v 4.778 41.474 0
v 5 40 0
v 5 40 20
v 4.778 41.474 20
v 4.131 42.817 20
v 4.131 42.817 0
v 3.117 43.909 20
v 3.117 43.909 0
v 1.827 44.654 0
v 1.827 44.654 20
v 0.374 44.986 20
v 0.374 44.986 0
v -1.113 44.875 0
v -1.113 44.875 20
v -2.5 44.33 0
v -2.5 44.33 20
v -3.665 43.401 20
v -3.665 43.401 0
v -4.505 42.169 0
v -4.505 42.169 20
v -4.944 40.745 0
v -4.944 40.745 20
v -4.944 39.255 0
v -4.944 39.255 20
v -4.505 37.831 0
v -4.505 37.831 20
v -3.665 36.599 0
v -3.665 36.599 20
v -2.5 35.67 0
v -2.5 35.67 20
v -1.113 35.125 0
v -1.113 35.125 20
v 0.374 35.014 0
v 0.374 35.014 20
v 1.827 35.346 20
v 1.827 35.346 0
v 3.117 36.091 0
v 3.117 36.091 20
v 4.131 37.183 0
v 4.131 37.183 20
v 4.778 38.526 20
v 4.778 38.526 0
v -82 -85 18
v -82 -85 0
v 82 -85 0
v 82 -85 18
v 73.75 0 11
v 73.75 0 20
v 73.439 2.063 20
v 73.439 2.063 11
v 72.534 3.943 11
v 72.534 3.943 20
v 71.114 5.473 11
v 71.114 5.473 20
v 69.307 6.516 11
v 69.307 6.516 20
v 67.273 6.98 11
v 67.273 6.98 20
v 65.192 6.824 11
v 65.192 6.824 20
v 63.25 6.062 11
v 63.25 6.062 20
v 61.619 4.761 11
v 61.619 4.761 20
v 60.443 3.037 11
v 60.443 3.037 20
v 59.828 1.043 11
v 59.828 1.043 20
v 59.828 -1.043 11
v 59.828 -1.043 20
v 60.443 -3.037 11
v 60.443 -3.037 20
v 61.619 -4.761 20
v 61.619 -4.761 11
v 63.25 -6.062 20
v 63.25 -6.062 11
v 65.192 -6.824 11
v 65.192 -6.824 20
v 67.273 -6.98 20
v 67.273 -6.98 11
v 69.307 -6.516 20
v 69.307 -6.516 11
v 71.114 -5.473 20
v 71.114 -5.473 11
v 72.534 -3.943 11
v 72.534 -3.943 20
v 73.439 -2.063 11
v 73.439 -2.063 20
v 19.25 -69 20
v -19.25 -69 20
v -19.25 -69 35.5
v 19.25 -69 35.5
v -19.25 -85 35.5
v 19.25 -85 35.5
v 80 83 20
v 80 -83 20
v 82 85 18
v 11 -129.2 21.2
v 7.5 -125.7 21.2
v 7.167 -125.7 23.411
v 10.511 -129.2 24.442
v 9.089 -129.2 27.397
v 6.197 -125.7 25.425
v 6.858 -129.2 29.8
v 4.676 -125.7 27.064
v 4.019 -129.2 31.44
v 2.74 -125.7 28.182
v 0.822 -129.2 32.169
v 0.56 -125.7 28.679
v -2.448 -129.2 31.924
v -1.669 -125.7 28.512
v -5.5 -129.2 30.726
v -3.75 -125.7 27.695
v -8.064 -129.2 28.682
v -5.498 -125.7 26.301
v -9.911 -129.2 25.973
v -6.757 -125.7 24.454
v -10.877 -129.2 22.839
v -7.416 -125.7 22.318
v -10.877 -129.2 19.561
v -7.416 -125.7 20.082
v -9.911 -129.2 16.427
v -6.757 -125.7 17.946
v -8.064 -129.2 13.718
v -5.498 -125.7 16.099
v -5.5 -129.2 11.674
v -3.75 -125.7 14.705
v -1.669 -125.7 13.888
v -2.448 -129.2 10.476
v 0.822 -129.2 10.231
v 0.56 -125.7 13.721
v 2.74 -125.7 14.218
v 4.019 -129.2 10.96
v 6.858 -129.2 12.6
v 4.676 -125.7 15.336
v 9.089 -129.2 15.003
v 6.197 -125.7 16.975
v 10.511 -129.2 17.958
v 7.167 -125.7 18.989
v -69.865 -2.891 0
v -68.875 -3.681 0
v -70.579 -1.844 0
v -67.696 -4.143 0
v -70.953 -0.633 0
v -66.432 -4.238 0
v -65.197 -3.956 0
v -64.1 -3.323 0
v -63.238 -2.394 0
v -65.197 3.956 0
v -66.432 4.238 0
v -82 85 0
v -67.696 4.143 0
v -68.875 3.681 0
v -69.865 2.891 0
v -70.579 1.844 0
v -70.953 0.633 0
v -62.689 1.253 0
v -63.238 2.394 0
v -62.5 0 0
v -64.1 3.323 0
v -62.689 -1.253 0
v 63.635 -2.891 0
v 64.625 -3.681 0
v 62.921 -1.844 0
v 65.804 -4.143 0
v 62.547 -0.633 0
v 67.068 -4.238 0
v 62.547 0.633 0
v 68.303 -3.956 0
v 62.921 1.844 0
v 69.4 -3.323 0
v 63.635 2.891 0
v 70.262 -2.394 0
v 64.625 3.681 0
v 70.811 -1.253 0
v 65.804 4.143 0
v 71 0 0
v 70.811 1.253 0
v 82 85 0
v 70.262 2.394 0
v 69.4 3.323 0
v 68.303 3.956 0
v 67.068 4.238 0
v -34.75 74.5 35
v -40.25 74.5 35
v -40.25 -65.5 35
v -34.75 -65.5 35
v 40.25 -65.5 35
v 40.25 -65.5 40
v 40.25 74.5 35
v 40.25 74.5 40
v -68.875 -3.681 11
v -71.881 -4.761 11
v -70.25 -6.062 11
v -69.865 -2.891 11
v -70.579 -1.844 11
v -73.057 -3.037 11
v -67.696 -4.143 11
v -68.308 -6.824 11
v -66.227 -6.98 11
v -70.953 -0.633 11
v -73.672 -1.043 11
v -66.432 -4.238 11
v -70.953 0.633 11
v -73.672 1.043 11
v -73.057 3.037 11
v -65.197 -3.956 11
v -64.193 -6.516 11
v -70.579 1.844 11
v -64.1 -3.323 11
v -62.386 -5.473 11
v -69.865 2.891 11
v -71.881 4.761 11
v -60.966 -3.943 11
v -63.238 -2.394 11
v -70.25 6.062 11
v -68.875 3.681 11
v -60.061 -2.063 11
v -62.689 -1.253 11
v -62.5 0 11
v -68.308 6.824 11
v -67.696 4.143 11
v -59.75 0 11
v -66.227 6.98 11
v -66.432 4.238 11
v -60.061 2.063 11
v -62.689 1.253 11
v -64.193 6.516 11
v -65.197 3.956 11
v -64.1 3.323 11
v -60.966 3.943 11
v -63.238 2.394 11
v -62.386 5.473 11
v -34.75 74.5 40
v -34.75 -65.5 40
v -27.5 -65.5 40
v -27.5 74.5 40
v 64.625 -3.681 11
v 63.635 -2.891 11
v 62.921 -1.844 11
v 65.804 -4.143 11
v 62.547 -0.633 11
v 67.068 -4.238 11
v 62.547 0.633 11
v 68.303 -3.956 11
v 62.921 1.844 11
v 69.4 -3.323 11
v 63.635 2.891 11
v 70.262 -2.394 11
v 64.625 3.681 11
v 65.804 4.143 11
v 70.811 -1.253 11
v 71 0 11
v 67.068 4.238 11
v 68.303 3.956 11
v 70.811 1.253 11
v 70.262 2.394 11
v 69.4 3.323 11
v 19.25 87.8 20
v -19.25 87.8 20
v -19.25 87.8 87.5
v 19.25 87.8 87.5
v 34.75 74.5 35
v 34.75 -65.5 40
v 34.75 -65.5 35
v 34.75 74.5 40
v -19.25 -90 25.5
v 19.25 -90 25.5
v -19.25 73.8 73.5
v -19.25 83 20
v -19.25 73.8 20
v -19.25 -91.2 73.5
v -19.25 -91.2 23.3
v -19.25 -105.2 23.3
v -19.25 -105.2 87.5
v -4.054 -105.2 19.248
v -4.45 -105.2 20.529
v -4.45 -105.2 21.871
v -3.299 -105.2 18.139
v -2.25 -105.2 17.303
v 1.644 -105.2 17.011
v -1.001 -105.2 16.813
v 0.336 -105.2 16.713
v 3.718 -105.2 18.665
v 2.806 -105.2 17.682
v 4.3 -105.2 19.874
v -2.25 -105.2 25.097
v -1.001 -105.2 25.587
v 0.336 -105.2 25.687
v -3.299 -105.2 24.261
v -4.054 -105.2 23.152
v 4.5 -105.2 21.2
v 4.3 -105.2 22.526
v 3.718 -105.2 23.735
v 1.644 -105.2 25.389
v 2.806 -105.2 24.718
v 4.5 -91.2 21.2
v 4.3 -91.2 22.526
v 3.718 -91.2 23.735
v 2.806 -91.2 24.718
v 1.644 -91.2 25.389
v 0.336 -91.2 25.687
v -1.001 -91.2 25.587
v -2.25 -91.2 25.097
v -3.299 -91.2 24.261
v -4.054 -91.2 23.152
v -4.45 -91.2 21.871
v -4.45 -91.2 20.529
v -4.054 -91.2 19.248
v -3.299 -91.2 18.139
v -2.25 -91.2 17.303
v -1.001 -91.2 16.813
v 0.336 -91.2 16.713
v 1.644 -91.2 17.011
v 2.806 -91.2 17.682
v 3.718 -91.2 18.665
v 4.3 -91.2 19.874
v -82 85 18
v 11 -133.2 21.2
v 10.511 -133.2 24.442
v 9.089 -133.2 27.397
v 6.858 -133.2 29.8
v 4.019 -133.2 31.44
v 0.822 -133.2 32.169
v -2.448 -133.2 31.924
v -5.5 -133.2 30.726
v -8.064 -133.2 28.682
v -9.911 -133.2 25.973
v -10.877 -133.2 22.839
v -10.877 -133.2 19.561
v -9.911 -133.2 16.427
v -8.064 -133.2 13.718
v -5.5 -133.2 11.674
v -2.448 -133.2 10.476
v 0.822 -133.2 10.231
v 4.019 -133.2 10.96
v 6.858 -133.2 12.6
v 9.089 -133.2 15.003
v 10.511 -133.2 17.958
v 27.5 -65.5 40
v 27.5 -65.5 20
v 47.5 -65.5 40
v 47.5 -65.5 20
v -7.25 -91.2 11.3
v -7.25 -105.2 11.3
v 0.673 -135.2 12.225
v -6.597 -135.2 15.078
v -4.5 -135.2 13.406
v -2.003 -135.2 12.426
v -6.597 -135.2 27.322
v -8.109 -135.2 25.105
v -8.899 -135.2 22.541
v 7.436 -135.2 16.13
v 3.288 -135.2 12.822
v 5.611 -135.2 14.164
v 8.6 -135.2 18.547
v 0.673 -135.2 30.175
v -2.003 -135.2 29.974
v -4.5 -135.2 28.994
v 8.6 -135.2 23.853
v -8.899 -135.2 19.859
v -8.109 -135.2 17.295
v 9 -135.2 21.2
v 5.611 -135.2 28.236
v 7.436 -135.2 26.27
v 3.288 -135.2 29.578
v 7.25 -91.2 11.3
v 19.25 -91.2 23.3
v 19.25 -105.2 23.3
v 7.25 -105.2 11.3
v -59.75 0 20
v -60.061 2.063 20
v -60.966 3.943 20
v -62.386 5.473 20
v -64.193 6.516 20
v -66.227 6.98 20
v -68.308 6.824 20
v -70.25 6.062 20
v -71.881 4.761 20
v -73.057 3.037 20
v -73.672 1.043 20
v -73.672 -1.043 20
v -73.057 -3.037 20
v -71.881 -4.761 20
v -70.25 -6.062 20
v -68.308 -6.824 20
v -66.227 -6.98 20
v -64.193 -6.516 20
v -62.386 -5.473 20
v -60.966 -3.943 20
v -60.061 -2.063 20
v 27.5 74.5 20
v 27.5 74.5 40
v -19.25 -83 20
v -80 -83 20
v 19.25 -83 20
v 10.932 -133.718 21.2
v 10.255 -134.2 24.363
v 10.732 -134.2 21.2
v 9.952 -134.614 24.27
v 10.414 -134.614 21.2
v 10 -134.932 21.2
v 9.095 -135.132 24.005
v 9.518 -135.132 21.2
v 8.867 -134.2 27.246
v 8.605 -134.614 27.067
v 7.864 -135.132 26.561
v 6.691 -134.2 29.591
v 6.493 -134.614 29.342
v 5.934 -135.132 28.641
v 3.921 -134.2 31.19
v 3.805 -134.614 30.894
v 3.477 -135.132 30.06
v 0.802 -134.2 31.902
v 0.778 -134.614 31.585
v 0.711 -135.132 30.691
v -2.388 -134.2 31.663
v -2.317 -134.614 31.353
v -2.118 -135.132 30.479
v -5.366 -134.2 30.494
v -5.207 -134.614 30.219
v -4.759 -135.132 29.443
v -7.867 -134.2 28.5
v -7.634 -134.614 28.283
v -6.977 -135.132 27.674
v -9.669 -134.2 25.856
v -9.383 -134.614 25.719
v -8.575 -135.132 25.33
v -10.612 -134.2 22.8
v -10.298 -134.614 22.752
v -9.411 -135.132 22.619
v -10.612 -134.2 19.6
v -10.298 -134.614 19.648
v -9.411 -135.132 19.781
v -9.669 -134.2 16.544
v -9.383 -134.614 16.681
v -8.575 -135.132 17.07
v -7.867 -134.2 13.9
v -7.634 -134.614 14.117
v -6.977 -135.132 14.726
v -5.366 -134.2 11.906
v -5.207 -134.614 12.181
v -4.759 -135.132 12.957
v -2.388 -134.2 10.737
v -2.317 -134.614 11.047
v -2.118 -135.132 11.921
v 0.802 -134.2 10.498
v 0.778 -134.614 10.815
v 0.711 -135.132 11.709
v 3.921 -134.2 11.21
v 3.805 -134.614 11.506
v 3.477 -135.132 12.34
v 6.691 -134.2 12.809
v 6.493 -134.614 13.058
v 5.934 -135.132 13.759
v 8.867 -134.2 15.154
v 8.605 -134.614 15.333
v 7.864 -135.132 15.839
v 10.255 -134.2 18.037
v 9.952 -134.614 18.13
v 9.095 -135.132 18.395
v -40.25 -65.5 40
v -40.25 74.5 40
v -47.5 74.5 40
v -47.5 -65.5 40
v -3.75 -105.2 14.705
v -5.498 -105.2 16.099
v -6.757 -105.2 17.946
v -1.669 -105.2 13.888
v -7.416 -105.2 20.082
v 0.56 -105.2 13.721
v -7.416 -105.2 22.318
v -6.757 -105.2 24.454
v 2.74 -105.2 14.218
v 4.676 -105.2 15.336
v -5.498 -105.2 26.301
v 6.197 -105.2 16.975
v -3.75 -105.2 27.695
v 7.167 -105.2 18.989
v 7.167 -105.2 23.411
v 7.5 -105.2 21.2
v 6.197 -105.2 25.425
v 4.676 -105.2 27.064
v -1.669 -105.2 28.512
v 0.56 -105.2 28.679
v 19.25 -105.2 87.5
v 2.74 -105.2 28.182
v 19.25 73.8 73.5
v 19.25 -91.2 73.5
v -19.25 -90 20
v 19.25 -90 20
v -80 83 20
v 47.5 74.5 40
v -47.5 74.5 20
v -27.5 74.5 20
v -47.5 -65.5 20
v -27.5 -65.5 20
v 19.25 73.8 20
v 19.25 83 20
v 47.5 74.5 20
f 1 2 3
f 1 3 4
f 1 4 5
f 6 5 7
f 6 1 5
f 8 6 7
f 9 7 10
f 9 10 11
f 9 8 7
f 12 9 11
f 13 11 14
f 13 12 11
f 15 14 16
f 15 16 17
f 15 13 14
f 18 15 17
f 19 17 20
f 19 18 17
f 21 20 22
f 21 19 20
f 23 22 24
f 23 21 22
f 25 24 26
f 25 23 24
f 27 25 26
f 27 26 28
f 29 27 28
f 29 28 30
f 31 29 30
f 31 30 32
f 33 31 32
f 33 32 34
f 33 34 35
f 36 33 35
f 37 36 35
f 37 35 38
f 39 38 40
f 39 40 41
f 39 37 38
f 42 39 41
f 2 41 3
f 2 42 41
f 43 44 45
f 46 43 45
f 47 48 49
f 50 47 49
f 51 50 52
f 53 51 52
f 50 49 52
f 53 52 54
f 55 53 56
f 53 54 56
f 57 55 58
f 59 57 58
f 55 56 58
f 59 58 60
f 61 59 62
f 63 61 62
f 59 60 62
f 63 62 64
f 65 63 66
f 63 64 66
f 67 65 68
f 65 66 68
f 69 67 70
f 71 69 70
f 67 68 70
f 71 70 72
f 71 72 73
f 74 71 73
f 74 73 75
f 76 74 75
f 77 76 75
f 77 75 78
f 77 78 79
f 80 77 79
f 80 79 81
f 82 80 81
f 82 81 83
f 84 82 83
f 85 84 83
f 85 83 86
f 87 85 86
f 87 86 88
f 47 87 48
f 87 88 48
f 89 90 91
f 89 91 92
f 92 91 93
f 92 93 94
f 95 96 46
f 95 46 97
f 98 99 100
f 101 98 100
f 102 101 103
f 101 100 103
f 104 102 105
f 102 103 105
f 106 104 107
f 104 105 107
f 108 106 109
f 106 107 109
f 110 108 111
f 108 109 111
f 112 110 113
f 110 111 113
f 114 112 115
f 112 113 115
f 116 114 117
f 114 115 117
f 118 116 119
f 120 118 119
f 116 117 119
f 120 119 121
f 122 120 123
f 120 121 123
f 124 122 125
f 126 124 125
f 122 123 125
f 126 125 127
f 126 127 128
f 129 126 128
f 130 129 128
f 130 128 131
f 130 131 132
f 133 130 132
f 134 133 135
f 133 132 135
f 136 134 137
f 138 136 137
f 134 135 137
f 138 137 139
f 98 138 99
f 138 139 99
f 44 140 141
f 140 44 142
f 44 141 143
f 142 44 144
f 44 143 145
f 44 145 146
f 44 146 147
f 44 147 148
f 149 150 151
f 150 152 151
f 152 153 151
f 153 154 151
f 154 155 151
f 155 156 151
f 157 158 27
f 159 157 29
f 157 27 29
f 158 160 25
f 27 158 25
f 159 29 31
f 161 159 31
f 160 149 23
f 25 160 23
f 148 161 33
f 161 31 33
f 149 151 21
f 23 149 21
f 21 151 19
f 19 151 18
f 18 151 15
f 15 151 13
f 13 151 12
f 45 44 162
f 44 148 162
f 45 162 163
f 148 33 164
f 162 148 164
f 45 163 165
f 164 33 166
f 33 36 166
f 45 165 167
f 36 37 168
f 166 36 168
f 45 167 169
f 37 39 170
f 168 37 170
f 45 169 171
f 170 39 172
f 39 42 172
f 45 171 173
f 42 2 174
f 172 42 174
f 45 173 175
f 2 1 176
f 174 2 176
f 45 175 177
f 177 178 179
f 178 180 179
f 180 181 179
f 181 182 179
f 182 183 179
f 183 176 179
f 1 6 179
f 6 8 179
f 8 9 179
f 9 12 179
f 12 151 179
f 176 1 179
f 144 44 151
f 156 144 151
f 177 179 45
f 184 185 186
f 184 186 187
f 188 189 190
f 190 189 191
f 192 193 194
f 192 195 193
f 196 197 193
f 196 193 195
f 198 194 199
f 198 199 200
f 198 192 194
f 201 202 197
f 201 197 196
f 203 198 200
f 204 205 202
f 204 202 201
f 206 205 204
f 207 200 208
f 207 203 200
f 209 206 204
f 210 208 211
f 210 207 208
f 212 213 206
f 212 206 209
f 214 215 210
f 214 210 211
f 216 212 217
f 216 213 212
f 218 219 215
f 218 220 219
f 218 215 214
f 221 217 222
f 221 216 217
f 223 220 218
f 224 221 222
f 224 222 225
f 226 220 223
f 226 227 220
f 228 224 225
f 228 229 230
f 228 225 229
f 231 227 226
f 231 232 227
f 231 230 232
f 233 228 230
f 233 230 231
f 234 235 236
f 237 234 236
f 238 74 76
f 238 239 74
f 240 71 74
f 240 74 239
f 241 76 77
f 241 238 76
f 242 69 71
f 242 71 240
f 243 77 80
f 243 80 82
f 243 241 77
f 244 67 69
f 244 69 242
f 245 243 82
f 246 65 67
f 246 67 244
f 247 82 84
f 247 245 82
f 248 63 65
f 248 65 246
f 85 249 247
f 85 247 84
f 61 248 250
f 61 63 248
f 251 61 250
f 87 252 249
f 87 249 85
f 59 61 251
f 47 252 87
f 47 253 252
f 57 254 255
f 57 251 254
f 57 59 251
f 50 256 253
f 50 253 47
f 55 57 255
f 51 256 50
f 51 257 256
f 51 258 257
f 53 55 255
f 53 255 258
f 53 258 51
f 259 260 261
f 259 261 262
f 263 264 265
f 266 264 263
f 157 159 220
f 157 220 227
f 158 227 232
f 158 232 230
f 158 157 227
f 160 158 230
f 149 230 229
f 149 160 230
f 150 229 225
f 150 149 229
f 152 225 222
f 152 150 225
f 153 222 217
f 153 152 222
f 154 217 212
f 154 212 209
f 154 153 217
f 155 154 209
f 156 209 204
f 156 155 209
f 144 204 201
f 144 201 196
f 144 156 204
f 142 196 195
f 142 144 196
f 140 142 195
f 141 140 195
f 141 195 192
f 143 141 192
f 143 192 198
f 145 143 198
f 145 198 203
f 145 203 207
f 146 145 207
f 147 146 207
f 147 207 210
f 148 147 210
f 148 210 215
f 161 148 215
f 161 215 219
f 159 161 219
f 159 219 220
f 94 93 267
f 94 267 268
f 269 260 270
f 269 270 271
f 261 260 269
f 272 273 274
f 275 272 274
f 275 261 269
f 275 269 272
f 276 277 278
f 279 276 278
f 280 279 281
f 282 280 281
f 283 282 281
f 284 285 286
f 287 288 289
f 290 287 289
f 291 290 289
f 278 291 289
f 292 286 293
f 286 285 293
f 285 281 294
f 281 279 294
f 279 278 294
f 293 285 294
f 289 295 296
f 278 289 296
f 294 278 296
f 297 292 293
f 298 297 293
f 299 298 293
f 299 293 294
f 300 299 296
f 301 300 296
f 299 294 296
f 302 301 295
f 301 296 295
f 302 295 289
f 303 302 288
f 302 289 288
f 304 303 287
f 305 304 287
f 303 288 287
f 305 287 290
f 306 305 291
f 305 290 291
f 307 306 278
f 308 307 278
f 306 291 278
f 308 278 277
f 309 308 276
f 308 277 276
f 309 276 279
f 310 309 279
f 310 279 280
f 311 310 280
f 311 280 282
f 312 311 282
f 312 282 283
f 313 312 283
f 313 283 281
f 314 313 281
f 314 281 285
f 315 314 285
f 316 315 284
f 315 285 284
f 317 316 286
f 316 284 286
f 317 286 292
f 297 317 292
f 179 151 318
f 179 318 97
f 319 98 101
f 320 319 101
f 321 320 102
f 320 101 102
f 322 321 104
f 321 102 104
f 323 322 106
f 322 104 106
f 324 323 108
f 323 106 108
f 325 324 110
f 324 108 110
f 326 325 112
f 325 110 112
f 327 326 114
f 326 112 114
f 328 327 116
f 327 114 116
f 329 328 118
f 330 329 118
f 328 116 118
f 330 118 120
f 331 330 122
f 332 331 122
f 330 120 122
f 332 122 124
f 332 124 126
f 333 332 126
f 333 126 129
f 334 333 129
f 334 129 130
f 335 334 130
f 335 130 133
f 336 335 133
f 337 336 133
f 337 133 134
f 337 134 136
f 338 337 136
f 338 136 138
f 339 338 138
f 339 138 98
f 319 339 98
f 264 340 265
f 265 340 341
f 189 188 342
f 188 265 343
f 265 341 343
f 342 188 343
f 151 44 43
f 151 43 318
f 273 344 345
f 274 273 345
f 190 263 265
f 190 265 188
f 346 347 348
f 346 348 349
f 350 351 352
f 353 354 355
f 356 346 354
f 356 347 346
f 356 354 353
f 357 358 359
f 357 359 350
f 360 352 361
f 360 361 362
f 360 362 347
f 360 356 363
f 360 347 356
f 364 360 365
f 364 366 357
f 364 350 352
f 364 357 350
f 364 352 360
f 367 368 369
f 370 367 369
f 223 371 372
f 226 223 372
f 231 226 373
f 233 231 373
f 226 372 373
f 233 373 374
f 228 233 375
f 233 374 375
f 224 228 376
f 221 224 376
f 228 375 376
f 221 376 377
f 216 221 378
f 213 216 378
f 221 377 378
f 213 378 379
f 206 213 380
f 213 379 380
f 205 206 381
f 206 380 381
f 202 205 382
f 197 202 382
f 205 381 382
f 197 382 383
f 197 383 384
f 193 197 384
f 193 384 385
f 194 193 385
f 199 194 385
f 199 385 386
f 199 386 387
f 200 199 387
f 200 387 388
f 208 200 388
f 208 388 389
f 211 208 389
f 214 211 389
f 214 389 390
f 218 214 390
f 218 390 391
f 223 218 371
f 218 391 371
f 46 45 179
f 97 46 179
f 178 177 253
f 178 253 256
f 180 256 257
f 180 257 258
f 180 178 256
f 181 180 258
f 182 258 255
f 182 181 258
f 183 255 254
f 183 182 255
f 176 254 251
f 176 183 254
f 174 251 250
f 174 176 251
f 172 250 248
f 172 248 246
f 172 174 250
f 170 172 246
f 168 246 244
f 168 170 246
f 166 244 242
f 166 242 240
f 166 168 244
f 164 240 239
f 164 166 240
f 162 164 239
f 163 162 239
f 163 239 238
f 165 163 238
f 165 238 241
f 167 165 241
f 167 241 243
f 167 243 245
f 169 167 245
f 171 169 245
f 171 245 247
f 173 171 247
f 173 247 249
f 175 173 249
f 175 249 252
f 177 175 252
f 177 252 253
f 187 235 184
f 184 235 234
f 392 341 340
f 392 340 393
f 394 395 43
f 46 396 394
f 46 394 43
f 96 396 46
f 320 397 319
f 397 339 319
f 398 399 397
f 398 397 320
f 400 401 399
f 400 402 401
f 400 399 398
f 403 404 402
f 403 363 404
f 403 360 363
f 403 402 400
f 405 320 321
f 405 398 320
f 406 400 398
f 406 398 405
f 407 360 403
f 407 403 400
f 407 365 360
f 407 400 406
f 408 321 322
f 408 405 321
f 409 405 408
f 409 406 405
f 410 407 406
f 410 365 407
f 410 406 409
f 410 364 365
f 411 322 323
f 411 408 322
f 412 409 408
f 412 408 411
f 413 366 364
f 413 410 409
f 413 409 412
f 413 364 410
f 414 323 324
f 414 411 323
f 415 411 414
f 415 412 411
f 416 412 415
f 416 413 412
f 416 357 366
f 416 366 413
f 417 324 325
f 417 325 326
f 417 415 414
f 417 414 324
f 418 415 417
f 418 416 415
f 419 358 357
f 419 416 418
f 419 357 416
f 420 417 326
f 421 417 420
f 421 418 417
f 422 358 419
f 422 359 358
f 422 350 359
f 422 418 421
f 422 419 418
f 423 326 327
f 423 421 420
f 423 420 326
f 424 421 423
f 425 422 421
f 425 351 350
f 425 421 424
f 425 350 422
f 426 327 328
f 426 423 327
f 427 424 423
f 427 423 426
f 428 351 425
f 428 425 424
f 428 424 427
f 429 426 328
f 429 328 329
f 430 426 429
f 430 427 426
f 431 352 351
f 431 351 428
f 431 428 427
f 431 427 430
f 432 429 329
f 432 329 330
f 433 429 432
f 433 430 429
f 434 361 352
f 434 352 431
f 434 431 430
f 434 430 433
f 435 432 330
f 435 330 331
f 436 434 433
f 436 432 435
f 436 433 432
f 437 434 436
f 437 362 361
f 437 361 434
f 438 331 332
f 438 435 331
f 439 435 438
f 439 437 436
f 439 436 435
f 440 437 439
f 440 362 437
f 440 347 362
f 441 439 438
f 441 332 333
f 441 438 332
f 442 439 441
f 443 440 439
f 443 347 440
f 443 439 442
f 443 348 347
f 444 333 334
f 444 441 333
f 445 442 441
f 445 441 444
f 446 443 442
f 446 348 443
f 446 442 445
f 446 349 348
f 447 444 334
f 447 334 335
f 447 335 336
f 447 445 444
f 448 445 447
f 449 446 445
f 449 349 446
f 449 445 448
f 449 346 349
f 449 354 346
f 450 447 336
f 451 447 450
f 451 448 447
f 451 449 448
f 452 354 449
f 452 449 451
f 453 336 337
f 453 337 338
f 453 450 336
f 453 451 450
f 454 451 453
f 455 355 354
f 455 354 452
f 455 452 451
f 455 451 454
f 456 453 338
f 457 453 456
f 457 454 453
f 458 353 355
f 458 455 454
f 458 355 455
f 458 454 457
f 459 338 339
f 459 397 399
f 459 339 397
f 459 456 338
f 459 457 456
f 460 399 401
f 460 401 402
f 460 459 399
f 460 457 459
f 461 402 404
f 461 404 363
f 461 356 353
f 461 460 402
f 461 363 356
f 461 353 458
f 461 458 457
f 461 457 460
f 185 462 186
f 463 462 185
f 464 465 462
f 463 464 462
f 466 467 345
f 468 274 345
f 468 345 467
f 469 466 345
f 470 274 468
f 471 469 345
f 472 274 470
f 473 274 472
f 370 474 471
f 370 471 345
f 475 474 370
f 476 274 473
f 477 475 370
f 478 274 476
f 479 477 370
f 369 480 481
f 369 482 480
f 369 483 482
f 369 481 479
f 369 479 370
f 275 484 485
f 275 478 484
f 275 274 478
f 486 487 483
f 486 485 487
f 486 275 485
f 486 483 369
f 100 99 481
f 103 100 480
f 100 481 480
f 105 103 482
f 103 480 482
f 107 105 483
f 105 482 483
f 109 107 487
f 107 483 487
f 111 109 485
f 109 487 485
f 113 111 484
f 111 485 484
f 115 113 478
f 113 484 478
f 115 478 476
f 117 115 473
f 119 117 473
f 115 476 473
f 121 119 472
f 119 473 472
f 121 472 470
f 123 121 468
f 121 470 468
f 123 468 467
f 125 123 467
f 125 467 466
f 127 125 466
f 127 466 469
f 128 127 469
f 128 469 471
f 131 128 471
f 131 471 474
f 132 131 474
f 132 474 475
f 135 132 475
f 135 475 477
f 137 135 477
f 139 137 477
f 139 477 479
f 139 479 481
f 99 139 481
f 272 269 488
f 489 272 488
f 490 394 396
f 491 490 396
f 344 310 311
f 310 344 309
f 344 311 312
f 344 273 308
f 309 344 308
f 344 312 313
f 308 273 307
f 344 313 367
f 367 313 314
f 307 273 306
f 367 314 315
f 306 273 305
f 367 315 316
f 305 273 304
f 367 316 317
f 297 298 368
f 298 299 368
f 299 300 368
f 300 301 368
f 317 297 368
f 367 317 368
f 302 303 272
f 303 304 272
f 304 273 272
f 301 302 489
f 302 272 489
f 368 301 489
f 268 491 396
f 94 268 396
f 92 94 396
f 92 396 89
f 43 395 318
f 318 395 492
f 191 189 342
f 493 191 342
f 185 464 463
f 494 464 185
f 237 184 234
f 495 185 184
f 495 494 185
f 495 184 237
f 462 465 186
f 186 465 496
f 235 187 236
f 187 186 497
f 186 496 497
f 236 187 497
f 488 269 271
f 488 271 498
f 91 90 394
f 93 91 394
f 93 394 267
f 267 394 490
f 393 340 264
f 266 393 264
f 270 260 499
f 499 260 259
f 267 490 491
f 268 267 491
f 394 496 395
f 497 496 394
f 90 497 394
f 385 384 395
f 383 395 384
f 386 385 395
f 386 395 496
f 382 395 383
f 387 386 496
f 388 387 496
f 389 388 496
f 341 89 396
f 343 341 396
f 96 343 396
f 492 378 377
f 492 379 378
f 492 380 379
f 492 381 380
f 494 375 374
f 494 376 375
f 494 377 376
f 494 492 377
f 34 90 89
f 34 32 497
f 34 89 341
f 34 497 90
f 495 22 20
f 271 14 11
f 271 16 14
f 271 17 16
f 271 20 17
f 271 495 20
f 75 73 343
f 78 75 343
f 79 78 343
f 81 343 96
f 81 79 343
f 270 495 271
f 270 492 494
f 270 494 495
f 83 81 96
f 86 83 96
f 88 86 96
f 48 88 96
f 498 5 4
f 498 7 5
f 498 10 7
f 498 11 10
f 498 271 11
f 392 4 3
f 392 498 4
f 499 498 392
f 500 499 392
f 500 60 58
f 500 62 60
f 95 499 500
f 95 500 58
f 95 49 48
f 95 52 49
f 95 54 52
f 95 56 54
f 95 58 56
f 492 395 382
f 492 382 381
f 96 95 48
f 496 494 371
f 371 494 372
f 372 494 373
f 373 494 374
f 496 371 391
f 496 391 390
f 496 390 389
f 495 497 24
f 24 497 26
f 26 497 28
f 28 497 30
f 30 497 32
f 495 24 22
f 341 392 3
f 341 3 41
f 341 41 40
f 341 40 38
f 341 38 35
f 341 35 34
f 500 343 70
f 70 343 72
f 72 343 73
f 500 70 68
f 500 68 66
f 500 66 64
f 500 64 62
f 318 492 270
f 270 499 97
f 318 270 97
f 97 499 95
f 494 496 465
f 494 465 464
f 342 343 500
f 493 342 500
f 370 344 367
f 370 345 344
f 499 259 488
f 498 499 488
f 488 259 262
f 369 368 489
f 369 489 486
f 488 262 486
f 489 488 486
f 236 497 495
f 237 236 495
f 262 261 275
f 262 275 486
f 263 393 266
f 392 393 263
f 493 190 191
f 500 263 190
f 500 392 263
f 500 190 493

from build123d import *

# Parameters (mm, degrees)
F0_W         = 164
F0_H         = 170
F0_R         = 4.25
F0_R_2       = 5
F1_DEPTH     = 20
F3_SIZE      = 2
F4_DEPTH     = 20
F2_R         = 7
F2_R_2       = 4.25
F5_DEPTH     = 9
F6_W         = 20
F6_H         = 140
F7_DEPTH     = 20
F8_W         = 5.5
F8_H         = 140
F9_DEPTH     = 5
F10_W        = 38.5
F10_H        = 2.8
F10_H_2      = 11.2
F11_DEPTH    = 67.5
F12_W        = 38.5
F12_H        = 14
F13_DEPTH    = 179
F14_W        = 38.5
F14_H        = 14
F15_DEPTH    = 62.2
F16_SIZE     = 12
F17_R        = 4.5
F18_DEPTH    = 14
F19_R        = 7.5
F19_R_2      = 4.5
F20_DEPTH    = 19
F21_R        = 11
F21_R_2      = 7.5
F22_DEPTH    = 11
F23_S5_R     = 7.5
F23_T6_DEPTH = 17
F24_R        = 2
F25_W        = 38.5
F25_H        = 16
F25_H_2      = 5
F26_DEPTH    = 15.5
F27_SIZE2    = 5
F27_SIZE     = 10


# Not quite as in the source:
# - a fillet or chamfer that OpenCascade refuses, or shapes differently, is made with other operations: its cross-section is extruded or revolved along the edge and cut away or added


with BuildPart() as f1:
    # F0 (on Top) → F1 (new body)
    with BuildSketch(Plane.XY):
        Rectangle(F0_W, F0_H)
        with Locations((-66.75, 0)):
            Circle(F0_R, mode=Mode.SUBTRACT)
        with Locations((0, 40)):
            Circle(F0_R_2, mode=Mode.SUBTRACT)
        with Locations((66.75, 0)):
            Circle(F0_R, mode=Mode.SUBTRACT)
    extrude(amount=F1_DEPTH)

    # F3
    f3_edges = [f1.edges().sort_by_distance(p)[0] for p in [
        (82, 0, 20),
        (0, -85, 20),
        (0, 85, 20),
        (-82, 0, 20),
    ]]
    chamfer(f3_edges, length=F3_SIZE)

    # F0 (on Top) → F4 (cut)
    with BuildSketch(Plane.XY):
        with Locations((0, 40)):
            Circle(F0_R_2)
    extrude(amount=F4_DEPTH, mode=Mode.SUBTRACT)

    # F2 (on face) → F5 (cut)
    with BuildSketch(Plane.XY.offset(20)):
        with Locations((-66.75, 0)):
            Circle(F2_R)
        with Locations((-66.75, 0)):
            Circle(F2_R_2, mode=Mode.SUBTRACT)
        with Locations((66.75, 0)):
            Circle(F2_R)
        with Locations((66.75, 0)):
            Circle(F2_R_2, mode=Mode.SUBTRACT)
    extrude(amount=-F5_DEPTH, mode=Mode.SUBTRACT)

    # F6 (on face) → F7 (join)
    with BuildSketch(Plane.XY.offset(20)):
        with Locations((-37.5, 4.5)):
            Rectangle(F6_W, F6_H)
        with Locations((37.5, 4.5)):
            Rectangle(F6_W, F6_H)
    extrude(amount=F7_DEPTH)

    # F8 (on face) → F9 (cut)
    with BuildSketch(Plane.XY.offset(40)):
        with Locations((-37.5, 4.5)):
            Rectangle(F8_W, F8_H)
        with Locations((37.5, 4.5)):
            Rectangle(F8_W, F8_H)
    extrude(amount=-F9_DEPTH, mode=Mode.SUBTRACT)

    # F10 (on face) → F11 (join)
    with BuildSketch(Plane.XY.offset(20)):
        with Locations((0, 86.4)):
            Rectangle(F10_W, F10_H)
        with Locations((0, 79.4)):
            Rectangle(F10_W, F10_H_2)
    extrude(amount=F11_DEPTH)

    # F12 (on face) → F13 (join)
    with BuildSketch(Plane.XZ.offset(-73.8)):
        with Locations((0, 80.5)):
            Rectangle(F12_W, F12_H)
    extrude(amount=F13_DEPTH)

    # F14 (on face) → F15 (join)
    with BuildSketch(Plane(origin=(0, 0, 73.5), x_dir=(1, 0, 0), z_dir=(0, 0, -1))):
        with Locations((0, 98.2)):
            Rectangle(F14_W, F14_H)
    extrude(amount=F15_DEPTH)

    # F16
    f16_edges = [f1.edges().sort_by_distance(p)[0] for p in [
        (-19.25, -98.2, 11.3),
        (19.25, -98.2, 11.3),
    ]]
    chamfer(f16_edges, length=F16_SIZE)

    # F17 (on face) → F18 (cut)
    with BuildSketch(Plane.XZ.offset(105.2)):
        with Locations((0, 21.2)):
            Circle(F17_R)
    extrude(amount=-F18_DEPTH, mode=Mode.SUBTRACT)

    # F19 (on face) → F20 (join)
    with BuildSketch(Plane.XZ.offset(105.2)):
        with Locations((0, 21.2)):
            Circle(F19_R)
        with Locations((0, 21.2)):
            Circle(F19_R_2, mode=Mode.SUBTRACT)
        with Locations((0, 21.2)):
            Circle(F19_R_2)
    extrude(amount=F20_DEPTH)

    # F21 (on face) → F22 (join)
    with BuildSketch(Plane.XZ.offset(124.2)):
        with Locations((0, 21.2)):
            Circle(F21_R)
        with Locations((0, 21.2)):
            Circle(F21_R_2, mode=Mode.SUBTRACT)
        with Locations((0, 21.2)):
            Circle(F21_R_2)
    extrude(amount=F22_DEPTH)

    # F23: chamfer of 5 on 1 edges, made by hand


with BuildPart() as f23_tool2:
    # F23_s3 → F23_t4 (revolve)
    with BuildSketch(Plane.XY.offset(21.2)):
        Polygon((11, -129.2), (6, -124.2), (11, -124.2), align=None)
    revolve(axis=Axis((0, -124.2, 21.2), (0, -1, 0)))

    # F23_s5 → F23_t6 (cut, symmetric)
    with BuildSketch(Plane.XZ.offset(126.7)):
        with Locations((0, 21.2)):
            Circle(F23_S5_R)
    extrude(amount=F23_T6_DEPTH, both=True, mode=Mode.SUBTRACT)


with BuildPart() as f1_1:
    add(f1.part)

    # F23_t1: cut F23_tool2
    add(f23_tool2.part, mode=Mode.SUBTRACT)

    # F24
    f24_edges = [f1_1.edges().sort_by_distance(p)[0] for p in [
        (-11, -135.2, 21.2),
    ]]
    fillet(f24_edges, radius=F24_R)

    # F25 (on face) → F26 (join)
    with BuildSketch(Plane.XY.offset(20)):
        with Locations((0, -77)):
            Rectangle(F25_W, F25_H)
        with Locations((0, -87.5)):
            Rectangle(F25_W, F25_H_2)
    extrude(amount=F26_DEPTH)

    # F27
    f27_edges = [f1_1.edges().sort_by_distance(p)[0] for p in [
        (0, -90, 35.5),
    ]]
    f27_side = f1_1.faces().sort_by_distance((0, -90, 27.75))[0]
    chamfer(f27_edges, length=F27_SIZE, length2=F27_SIZE2, reference=f27_side)


solid = f1_1.part
